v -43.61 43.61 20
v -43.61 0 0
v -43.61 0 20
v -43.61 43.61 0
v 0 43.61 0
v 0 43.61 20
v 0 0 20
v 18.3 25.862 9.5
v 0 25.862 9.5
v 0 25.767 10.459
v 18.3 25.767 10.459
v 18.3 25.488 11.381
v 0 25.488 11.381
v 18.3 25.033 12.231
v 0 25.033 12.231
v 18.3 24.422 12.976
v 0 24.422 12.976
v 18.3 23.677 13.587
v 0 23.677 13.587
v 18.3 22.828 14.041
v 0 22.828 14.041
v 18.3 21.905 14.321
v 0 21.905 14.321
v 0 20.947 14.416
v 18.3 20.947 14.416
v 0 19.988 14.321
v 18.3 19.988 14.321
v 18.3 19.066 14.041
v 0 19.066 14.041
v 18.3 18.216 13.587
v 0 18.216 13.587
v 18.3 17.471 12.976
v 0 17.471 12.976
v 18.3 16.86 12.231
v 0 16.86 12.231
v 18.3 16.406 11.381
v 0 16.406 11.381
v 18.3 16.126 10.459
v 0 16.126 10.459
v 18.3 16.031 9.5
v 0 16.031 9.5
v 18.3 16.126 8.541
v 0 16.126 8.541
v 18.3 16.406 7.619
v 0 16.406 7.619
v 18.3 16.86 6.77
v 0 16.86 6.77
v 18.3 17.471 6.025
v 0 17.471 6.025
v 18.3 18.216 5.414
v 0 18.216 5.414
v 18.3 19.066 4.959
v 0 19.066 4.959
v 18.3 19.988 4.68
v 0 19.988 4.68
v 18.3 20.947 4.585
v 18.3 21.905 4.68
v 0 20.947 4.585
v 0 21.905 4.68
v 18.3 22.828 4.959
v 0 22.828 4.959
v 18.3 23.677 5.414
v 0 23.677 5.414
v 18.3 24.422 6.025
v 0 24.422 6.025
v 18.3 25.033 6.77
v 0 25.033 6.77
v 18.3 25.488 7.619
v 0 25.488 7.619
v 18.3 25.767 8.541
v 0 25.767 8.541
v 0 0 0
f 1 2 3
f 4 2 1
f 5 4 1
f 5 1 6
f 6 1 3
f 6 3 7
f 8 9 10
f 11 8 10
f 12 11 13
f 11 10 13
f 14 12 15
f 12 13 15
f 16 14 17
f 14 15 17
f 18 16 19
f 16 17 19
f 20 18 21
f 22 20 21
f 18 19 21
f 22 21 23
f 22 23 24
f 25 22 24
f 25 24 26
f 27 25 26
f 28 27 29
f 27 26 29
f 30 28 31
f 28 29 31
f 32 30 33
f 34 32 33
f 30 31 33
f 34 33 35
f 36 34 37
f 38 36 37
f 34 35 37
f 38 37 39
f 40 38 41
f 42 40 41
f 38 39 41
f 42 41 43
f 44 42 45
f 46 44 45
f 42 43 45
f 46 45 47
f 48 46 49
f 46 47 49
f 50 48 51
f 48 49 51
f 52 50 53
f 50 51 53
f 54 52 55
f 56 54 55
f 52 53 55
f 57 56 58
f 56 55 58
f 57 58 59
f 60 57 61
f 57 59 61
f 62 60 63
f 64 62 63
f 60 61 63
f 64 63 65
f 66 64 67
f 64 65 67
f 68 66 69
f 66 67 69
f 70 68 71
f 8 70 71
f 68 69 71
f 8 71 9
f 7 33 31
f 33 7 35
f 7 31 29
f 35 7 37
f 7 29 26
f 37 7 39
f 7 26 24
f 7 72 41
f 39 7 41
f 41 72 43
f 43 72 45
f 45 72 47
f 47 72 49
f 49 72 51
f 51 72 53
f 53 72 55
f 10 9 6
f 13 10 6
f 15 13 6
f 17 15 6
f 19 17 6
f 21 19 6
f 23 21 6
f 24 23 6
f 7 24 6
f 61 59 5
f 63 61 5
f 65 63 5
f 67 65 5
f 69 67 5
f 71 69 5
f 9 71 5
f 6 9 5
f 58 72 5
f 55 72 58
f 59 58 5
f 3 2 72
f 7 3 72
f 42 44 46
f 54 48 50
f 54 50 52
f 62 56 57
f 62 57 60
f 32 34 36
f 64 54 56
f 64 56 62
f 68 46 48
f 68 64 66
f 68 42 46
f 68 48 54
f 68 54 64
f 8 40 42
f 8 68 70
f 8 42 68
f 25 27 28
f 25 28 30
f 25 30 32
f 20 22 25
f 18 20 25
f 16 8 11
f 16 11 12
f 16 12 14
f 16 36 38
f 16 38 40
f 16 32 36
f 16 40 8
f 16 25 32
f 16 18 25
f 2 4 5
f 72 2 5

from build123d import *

# Parameters (mm, degrees)
F0_W     = 43.610103
F0_H     = 43.610103
F1_DEPTH = 20
F2_R     = 4.915217
F3_DEPTH = 18.3


with BuildPart() as f1:
    # F0 (on Top) → F1 (new body)
    with BuildSketch(Plane.XY):
        with Locations((-21.805051, 21.805051)):
            Rectangle(F0_W, F0_H)
    extrude(amount=F1_DEPTH)

    # F2 (on Right) → F3 (join)
    with BuildSketch(Plane.YZ):
        with Locations((20.946585, 9.500364)):
            Circle(F2_R)
    extrude(amount=F3_DEPTH)


solid = f1.part
